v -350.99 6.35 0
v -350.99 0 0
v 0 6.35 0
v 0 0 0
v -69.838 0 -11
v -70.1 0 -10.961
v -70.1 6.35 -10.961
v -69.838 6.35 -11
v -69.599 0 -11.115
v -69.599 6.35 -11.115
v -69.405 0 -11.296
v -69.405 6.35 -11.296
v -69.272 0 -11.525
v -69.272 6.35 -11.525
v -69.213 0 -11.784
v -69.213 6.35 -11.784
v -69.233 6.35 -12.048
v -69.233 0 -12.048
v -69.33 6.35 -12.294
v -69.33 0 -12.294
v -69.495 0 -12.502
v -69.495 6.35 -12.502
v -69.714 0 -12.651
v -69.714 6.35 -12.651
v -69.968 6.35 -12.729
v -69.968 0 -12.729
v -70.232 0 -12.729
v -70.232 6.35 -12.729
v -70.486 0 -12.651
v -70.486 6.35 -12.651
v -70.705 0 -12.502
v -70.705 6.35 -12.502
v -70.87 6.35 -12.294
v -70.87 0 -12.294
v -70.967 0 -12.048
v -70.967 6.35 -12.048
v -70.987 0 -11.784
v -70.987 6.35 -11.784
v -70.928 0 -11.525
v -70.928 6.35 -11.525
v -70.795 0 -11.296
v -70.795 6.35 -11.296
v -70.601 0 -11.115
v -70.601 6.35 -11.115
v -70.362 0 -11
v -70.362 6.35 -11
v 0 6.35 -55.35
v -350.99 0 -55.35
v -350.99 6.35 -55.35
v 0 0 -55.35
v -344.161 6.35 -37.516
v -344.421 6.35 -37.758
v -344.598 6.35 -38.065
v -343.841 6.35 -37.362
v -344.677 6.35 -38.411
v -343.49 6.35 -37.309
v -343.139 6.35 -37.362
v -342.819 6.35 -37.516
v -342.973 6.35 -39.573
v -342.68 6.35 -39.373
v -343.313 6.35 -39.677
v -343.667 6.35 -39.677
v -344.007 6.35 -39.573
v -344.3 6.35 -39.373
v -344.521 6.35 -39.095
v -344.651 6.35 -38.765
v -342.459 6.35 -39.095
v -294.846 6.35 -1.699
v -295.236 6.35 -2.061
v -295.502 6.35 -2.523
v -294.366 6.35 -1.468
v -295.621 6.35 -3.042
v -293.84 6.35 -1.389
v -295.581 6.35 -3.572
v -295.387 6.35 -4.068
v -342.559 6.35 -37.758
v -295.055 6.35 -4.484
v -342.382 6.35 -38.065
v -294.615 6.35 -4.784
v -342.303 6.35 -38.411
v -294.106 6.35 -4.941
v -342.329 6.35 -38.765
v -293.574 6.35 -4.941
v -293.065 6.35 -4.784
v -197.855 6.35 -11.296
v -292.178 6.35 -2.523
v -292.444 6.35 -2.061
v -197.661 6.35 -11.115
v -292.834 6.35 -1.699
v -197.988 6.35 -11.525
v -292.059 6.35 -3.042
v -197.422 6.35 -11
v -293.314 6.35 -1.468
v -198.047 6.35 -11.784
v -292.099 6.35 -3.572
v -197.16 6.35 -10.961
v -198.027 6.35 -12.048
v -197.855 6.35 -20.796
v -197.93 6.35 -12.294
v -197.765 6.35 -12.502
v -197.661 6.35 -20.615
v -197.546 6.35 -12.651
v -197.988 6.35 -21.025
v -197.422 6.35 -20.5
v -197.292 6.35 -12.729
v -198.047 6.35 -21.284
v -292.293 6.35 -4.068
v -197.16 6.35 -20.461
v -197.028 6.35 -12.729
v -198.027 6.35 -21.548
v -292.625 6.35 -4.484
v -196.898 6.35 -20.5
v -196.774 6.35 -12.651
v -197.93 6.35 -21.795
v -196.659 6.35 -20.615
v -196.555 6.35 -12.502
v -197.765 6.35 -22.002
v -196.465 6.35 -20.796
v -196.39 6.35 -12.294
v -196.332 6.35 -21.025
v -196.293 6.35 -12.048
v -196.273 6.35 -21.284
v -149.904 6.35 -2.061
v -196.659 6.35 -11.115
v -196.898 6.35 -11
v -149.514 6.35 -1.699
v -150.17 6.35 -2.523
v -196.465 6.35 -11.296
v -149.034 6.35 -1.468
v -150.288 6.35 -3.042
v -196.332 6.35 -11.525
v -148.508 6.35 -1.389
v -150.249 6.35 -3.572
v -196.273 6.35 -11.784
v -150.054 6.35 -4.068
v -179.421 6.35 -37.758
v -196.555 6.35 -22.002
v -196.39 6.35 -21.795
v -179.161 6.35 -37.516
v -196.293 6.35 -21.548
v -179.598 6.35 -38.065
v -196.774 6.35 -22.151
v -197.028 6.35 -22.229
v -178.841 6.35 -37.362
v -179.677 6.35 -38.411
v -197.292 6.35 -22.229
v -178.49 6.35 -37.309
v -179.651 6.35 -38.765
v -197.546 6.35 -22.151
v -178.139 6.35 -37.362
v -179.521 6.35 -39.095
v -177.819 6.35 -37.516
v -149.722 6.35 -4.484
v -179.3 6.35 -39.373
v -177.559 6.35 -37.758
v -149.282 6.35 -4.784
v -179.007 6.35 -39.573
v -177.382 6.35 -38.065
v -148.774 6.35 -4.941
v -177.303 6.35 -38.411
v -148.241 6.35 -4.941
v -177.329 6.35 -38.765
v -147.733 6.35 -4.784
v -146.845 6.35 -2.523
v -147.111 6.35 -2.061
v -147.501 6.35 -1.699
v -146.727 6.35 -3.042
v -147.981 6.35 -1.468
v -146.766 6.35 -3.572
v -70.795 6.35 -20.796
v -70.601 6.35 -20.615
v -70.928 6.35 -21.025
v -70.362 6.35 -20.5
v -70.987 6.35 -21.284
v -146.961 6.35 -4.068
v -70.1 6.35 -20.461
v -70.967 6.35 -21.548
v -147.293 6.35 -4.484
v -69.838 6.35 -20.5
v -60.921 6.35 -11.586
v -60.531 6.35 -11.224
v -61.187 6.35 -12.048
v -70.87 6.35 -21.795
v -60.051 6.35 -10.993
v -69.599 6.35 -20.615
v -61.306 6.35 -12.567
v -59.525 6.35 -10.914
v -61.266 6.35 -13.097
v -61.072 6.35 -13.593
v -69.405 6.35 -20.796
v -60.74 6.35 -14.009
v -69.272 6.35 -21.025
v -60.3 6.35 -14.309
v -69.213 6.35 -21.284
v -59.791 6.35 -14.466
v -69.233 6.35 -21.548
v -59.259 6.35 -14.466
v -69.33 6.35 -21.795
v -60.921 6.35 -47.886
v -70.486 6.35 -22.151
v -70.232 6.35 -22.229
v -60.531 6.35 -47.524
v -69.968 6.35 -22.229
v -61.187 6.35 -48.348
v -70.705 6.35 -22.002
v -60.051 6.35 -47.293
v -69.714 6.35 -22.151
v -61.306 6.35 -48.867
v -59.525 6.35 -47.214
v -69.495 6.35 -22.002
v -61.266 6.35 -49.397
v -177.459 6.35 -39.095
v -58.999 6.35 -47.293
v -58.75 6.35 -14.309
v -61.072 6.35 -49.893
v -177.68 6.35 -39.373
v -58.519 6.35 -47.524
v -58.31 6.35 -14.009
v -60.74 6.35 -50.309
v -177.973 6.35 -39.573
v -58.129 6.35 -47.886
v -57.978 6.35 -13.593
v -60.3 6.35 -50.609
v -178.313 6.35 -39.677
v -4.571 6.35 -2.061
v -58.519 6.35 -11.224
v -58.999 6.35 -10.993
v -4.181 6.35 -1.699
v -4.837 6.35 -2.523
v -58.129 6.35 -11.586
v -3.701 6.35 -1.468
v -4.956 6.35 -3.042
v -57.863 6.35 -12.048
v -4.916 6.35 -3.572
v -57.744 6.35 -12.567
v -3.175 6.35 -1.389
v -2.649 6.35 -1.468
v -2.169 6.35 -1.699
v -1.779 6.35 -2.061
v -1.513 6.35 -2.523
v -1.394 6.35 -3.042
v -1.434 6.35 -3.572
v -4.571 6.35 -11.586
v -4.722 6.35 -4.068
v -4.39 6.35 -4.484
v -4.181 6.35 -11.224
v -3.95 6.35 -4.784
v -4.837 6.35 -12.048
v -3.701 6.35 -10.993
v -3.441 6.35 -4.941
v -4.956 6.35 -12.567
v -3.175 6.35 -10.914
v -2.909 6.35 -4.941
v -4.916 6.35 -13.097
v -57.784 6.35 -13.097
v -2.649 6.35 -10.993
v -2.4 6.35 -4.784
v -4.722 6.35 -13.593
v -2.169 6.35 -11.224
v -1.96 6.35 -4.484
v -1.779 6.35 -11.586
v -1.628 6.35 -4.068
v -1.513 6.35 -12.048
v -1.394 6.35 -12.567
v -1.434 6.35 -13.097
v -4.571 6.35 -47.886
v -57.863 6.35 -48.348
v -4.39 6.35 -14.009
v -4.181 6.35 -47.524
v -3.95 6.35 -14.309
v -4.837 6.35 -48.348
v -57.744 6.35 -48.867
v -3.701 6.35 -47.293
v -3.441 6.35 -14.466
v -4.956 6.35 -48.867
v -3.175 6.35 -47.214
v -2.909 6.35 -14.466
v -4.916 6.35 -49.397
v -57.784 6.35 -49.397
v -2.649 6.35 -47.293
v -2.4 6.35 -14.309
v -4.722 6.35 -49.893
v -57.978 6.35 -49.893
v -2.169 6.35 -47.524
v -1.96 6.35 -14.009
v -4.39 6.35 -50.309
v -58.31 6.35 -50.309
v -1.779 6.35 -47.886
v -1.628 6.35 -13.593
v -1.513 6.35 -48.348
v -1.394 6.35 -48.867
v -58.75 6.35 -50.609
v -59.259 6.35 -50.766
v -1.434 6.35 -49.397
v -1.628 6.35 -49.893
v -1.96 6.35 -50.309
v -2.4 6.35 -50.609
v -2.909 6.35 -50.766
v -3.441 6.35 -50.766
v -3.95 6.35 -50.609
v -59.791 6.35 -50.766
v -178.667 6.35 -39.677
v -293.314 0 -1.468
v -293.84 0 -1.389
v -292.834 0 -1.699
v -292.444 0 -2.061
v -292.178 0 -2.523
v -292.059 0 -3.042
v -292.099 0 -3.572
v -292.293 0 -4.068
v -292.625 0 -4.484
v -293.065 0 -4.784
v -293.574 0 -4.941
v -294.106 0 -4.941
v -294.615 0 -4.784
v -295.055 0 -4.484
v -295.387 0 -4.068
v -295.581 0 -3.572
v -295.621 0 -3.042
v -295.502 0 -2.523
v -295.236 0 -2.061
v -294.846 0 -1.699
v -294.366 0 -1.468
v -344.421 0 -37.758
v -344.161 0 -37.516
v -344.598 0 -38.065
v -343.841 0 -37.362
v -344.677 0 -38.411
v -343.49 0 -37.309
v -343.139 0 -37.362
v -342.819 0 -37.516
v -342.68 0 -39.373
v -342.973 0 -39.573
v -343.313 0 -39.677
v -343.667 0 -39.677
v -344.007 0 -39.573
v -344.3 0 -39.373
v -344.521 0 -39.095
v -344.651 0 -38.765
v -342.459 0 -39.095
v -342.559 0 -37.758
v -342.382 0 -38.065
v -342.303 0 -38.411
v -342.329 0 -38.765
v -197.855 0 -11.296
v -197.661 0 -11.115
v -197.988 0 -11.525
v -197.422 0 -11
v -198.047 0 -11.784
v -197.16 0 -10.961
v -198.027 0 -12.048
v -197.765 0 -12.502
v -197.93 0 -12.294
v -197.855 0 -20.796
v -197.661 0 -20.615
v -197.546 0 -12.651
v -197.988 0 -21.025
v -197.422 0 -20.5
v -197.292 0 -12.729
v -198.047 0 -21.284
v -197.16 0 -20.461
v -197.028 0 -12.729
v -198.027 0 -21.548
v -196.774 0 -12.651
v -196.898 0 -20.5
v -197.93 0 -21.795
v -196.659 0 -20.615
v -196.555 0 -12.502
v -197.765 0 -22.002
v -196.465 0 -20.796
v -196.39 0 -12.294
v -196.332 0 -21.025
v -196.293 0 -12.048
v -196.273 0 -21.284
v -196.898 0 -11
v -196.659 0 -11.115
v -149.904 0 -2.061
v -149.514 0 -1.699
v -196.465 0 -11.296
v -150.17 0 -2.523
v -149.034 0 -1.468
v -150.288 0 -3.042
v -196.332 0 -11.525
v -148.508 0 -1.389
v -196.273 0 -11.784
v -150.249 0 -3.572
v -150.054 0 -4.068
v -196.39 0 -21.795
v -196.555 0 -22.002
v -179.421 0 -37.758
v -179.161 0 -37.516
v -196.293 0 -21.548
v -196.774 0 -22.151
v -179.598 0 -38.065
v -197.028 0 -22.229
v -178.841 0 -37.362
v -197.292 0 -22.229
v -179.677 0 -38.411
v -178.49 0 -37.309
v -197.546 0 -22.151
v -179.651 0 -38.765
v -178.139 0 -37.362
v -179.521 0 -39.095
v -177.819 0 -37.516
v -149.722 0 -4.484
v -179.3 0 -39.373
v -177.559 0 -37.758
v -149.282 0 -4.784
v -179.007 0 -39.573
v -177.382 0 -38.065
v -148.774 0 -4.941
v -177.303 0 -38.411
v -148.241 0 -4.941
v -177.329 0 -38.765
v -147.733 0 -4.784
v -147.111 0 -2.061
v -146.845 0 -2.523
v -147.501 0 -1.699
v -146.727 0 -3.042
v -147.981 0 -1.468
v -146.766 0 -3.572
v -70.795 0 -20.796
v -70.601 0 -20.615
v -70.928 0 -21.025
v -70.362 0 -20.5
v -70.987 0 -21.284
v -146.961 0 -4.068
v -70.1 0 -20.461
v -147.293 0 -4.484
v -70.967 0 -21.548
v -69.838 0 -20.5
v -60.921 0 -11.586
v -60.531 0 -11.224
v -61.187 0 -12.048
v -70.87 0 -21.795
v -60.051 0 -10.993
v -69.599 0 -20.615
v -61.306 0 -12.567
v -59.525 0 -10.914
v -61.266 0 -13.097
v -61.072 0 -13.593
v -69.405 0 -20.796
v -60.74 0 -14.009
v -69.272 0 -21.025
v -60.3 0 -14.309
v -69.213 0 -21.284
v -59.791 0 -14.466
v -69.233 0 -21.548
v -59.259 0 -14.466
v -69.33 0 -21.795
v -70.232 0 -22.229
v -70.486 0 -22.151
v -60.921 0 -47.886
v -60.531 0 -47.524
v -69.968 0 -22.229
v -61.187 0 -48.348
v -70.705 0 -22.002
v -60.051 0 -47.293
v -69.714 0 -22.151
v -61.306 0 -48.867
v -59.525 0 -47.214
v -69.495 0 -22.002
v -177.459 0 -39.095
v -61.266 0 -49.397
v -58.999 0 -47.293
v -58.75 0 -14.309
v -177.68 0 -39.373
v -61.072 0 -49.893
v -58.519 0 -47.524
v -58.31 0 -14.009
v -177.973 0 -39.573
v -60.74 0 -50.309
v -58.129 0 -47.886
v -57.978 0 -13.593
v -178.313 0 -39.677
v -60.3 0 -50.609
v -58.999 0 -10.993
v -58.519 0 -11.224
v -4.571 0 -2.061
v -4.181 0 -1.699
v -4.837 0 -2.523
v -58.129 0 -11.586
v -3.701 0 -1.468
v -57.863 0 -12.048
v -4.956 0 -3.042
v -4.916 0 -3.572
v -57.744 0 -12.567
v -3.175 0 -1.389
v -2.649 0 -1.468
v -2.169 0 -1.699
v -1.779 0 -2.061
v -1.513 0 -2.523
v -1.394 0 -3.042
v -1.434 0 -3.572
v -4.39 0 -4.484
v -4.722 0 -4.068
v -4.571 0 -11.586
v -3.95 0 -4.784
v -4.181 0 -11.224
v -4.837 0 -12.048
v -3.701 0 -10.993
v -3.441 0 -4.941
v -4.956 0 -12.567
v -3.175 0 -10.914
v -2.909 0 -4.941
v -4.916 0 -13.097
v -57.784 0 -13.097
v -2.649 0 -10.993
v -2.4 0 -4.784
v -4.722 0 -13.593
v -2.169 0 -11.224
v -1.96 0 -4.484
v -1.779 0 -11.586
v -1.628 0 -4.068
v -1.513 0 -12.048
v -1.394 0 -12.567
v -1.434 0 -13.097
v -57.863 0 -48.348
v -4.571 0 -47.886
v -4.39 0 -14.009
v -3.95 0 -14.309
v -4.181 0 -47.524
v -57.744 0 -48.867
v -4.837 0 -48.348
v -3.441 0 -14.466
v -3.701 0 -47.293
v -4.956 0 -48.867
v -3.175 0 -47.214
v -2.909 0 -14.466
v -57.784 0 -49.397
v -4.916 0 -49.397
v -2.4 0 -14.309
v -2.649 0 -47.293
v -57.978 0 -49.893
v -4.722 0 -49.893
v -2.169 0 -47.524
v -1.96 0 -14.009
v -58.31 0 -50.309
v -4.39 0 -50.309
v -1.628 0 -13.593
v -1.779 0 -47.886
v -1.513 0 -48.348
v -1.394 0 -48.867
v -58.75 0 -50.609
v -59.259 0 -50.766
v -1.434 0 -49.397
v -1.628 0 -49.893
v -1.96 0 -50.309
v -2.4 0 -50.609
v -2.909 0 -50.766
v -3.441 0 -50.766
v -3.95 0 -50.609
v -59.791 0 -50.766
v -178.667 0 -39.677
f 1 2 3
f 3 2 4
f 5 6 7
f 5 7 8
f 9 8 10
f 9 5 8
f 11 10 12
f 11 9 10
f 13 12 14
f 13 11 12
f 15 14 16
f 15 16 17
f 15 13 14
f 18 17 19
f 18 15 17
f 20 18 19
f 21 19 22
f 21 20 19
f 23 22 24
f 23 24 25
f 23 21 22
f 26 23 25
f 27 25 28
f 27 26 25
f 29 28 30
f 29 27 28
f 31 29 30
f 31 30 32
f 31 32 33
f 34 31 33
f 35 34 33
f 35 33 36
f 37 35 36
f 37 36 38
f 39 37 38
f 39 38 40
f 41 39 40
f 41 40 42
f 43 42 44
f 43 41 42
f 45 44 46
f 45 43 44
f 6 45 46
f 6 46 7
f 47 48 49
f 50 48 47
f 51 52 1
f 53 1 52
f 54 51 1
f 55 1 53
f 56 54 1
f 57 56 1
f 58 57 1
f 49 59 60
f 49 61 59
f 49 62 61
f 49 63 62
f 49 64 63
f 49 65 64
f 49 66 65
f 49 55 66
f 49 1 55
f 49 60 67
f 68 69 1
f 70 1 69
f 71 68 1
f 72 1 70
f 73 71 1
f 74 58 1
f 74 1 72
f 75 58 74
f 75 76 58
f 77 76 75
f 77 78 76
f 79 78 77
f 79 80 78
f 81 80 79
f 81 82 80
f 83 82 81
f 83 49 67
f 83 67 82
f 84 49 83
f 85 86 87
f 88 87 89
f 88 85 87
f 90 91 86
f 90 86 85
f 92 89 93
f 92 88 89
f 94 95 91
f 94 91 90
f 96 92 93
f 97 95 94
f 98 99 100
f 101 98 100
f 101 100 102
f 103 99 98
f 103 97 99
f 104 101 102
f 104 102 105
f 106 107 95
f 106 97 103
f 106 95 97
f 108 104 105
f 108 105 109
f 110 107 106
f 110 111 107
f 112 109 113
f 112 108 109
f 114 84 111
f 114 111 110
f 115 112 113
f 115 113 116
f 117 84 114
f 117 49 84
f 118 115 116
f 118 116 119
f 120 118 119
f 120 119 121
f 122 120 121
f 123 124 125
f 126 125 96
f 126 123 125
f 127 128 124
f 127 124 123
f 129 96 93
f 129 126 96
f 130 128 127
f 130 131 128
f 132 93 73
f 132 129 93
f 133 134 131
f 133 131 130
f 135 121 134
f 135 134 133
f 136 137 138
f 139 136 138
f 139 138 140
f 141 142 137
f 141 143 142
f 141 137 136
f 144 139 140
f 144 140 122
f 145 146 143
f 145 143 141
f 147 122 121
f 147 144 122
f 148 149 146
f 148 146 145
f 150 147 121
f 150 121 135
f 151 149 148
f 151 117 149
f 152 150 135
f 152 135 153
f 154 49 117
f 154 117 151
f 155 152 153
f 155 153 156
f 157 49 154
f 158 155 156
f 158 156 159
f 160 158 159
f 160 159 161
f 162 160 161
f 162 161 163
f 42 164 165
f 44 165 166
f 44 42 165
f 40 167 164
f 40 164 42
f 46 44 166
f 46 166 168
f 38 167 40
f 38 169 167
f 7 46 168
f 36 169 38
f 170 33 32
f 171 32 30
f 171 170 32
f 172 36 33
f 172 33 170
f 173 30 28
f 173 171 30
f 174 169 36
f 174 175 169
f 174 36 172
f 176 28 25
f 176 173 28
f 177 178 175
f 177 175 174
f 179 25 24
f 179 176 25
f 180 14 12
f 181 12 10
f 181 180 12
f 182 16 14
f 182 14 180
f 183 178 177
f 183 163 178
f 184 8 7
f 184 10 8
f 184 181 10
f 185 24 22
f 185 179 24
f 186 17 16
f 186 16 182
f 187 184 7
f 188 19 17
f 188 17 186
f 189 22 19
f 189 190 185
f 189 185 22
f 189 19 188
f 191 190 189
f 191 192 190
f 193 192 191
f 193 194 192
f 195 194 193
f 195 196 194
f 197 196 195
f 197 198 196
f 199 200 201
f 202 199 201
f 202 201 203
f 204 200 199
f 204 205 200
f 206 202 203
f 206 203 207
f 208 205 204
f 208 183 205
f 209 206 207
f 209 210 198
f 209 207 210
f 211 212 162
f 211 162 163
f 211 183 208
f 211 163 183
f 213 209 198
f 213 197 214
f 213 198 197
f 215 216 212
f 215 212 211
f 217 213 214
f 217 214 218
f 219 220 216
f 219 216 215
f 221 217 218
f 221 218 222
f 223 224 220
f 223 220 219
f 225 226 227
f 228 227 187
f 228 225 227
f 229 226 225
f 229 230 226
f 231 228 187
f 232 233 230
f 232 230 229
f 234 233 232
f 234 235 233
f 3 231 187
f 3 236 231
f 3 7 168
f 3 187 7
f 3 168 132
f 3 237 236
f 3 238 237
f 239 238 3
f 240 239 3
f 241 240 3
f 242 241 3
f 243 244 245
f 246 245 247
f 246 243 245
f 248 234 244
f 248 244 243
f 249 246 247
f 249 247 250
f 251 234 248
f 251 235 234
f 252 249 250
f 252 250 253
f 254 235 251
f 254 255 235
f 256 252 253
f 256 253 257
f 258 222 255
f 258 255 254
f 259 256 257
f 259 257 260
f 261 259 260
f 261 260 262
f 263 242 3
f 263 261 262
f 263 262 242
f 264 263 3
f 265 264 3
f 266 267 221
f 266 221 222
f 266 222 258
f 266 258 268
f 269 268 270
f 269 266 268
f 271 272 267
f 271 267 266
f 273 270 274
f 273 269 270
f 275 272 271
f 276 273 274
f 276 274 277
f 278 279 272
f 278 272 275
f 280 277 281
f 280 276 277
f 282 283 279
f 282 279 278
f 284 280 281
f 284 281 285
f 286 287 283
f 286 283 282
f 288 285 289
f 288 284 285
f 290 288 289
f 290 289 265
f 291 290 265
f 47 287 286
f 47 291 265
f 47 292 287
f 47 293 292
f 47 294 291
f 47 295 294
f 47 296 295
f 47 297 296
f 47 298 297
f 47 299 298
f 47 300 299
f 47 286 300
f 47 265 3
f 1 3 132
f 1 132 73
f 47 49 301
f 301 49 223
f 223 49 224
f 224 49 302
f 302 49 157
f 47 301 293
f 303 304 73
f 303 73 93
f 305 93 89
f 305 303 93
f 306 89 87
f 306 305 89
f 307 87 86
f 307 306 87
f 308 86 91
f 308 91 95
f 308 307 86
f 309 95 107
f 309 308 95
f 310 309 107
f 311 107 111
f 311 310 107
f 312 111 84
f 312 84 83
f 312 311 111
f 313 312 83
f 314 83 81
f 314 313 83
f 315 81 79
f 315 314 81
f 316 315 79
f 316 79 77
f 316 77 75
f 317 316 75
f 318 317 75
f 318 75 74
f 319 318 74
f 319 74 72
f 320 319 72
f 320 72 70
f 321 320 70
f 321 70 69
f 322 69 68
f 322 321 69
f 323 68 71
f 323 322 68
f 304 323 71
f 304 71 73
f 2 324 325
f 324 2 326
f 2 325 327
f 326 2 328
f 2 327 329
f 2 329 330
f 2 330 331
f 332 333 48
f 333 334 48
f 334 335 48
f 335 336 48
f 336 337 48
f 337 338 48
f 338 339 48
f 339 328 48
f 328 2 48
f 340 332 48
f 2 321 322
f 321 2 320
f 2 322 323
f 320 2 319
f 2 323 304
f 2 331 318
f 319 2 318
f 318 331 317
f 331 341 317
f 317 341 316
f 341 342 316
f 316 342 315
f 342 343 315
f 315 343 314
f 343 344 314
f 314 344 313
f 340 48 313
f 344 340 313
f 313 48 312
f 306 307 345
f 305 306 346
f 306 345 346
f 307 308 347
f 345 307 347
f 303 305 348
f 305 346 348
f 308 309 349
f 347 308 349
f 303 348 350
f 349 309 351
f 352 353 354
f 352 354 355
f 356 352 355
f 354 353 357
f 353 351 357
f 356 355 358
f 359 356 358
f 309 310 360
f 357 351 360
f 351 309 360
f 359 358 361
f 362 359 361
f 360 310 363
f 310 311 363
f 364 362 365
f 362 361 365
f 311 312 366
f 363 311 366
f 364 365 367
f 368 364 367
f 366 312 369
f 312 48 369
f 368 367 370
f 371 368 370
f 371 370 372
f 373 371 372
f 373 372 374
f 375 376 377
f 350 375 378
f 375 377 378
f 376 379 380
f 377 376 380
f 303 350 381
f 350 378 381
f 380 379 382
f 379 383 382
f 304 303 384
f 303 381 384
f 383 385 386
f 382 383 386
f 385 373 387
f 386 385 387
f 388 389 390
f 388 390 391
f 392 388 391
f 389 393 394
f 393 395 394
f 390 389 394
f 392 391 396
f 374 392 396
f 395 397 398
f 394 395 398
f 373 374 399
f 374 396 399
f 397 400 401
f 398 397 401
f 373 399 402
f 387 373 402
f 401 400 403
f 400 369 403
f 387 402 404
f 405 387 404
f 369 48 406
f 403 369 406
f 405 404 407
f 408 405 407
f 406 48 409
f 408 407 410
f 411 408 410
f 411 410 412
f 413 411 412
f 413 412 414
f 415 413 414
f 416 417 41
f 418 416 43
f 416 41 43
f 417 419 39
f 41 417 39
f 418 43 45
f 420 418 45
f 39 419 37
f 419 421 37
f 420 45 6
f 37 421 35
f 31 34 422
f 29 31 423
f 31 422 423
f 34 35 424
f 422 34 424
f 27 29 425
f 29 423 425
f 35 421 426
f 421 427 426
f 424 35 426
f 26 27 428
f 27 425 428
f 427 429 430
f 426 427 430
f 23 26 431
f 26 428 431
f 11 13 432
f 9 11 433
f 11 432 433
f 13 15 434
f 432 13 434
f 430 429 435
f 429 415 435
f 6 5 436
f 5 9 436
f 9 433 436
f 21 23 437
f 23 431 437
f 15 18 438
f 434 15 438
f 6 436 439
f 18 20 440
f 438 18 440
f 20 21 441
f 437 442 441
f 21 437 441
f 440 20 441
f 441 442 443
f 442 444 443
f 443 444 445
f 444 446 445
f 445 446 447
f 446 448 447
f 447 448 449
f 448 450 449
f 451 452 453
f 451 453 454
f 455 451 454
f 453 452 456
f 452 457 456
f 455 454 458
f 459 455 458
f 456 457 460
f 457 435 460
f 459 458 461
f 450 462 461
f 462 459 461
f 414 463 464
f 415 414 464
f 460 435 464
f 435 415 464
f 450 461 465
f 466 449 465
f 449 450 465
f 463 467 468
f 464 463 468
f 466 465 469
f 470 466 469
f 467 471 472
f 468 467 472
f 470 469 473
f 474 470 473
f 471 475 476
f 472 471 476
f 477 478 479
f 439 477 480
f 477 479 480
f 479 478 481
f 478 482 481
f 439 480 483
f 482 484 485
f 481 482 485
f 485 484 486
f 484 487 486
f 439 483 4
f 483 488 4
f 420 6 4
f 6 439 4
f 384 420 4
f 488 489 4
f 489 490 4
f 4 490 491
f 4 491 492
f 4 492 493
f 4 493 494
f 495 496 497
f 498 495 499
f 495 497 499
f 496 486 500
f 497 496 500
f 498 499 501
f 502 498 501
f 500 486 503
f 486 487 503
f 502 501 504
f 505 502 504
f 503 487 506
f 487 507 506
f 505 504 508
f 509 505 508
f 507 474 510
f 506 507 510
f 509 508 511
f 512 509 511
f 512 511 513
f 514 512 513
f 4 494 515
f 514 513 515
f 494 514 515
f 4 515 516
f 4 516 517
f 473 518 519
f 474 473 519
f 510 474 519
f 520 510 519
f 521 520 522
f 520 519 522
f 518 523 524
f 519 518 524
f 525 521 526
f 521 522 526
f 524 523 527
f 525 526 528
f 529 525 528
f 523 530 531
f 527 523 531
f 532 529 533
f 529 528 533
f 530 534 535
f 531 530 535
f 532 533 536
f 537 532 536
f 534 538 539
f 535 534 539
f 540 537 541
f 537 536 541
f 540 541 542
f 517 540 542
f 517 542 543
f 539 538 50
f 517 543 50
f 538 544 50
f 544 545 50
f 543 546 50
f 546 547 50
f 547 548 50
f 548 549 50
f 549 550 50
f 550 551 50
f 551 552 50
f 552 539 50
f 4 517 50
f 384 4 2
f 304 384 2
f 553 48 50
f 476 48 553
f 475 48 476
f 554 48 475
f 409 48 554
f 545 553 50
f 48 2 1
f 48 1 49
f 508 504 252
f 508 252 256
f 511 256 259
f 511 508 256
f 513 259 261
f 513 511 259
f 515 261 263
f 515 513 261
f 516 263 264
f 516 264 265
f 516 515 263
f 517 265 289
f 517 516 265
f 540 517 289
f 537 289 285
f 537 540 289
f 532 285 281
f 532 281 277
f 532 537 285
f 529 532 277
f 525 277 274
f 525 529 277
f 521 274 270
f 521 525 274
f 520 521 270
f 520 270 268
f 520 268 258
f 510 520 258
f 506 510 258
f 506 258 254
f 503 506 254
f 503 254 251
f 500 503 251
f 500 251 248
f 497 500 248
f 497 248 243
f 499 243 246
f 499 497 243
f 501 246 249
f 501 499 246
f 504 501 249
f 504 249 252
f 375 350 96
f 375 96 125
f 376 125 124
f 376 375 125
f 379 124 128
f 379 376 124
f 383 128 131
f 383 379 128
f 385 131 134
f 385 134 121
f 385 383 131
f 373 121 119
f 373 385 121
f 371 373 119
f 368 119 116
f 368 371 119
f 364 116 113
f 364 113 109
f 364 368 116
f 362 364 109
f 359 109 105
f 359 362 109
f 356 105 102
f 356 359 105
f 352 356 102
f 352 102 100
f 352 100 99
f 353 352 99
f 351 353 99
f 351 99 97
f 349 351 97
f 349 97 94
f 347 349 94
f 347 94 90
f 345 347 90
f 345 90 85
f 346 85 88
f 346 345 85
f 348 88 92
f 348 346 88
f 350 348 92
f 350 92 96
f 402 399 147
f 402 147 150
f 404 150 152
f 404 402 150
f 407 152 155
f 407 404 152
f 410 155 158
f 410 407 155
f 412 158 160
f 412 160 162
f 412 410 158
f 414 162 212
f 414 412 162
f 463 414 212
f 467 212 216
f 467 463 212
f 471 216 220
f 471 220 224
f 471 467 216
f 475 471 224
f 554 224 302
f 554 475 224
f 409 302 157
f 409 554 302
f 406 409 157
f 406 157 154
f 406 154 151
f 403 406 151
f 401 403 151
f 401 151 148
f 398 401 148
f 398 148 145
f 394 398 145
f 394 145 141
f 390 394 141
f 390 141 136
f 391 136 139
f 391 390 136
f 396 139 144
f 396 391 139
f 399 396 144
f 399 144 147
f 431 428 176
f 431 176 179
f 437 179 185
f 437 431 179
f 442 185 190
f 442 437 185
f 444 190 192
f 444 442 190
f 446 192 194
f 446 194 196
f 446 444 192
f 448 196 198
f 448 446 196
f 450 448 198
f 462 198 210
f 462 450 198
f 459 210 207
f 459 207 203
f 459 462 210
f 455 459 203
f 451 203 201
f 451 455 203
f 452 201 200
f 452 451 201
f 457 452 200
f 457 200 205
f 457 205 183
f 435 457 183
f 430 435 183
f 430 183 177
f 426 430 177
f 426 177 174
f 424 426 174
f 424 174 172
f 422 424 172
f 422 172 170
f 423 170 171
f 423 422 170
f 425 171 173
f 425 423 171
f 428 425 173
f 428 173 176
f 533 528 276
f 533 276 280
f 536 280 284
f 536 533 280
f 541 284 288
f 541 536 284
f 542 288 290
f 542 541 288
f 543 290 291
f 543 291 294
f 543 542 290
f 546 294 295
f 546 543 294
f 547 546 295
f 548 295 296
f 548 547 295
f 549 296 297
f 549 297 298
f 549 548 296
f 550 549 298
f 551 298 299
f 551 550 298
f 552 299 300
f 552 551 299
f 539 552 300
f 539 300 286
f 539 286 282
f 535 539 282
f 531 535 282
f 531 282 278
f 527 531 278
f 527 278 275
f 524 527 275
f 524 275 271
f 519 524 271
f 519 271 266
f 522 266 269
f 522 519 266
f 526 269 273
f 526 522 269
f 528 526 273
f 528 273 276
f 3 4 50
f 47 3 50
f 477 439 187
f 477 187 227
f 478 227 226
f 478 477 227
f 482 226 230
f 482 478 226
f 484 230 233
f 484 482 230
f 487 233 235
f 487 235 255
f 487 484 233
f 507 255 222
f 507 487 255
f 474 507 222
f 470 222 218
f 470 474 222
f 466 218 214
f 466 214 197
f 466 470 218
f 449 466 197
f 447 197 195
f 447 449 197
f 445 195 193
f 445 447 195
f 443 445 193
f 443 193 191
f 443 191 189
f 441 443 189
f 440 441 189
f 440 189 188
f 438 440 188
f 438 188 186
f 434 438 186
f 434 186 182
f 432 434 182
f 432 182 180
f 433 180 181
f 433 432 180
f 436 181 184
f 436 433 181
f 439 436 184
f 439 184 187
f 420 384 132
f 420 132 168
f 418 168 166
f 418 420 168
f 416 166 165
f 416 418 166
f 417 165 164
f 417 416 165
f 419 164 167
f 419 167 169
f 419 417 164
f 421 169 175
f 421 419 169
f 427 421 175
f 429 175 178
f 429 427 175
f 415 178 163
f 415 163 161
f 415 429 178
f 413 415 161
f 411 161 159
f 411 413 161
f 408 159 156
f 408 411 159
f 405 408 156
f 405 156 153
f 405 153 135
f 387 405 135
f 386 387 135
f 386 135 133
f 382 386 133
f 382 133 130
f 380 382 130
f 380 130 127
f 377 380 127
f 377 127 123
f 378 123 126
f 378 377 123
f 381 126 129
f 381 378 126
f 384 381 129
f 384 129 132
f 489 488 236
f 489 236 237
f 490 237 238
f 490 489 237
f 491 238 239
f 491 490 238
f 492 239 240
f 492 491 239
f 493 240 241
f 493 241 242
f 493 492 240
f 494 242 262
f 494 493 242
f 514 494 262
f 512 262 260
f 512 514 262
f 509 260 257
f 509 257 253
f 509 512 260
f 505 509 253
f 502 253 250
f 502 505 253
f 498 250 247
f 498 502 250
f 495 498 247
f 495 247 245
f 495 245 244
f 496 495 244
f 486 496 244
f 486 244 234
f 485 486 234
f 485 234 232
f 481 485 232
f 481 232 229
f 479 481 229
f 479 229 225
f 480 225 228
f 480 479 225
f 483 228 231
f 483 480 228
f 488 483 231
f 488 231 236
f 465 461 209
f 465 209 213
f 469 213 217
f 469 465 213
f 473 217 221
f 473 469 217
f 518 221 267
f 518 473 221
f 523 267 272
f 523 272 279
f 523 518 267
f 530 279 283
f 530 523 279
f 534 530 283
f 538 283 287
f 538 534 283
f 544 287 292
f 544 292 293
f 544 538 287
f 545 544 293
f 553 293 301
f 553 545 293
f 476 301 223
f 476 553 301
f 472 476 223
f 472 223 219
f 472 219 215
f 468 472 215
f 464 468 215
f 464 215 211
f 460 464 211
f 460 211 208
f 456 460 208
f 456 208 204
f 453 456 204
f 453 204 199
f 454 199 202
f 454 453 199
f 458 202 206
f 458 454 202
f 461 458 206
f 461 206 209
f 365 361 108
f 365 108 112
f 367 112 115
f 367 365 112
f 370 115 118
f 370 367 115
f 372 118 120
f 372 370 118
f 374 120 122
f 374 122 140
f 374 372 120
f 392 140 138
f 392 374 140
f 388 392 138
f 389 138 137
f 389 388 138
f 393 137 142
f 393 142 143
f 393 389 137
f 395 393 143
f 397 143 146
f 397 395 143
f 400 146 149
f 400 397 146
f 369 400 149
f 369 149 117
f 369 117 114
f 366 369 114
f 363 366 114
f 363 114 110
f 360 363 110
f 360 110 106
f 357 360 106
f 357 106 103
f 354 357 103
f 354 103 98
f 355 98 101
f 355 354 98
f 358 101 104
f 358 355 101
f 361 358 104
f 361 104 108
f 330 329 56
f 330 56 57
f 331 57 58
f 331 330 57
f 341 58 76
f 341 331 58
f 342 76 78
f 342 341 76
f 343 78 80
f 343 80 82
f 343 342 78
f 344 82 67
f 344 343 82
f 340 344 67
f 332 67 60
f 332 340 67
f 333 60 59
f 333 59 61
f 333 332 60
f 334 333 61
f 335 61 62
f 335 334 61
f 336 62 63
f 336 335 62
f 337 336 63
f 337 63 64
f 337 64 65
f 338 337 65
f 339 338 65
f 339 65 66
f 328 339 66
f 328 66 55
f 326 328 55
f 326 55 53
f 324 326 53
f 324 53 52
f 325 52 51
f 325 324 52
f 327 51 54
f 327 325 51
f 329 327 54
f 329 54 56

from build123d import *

# Parameters (mm, degrees)
SKETCH1_W           = 350.99
SKETCH1_H           = 55.35
SKETCH1_R           = 1.7859375
SKETCH1_R_2         = 0.889
SKETCH1_R_3         = 1.190625
BOSS_EXTRUDE1_DEPTH = 6.35


with BuildPart() as part:
    # Sketch1 → Boss-Extrude1 (new body)
    with BuildSketch(Plane(origin=(0, 0, 0), x_dir=(1, 0, 0), z_dir=(0, 1, 0))):
        with Locations((-175.495, 27.675)):
            Rectangle(SKETCH1_W, SKETCH1_H)
        with Locations(Location((-293.84, 3.175, 0), (0, 0, 270))):
            Circle(SKETCH1_R, mode=Mode.SUBTRACT)
        with Locations(Location((-197.16, 11.85, 0), (0, 0, 270))):
            Circle(SKETCH1_R_2, mode=Mode.SUBTRACT)
        with Locations(Location((-197.16, 21.35, 0), (0, 0, 270))):
            Circle(SKETCH1_R_2, mode=Mode.SUBTRACT)
        with Locations(Location((-70.1, 21.35, 0), (0, 0, 270))):
            Circle(SKETCH1_R_2, mode=Mode.SUBTRACT)
        with Locations(Location((-70.1, 11.85, 0), (0, 0, 270))):
            Circle(SKETCH1_R_2, mode=Mode.SUBTRACT)
        with Locations(Location((-343.49, 38.5, 0), (0, 0, 270))):
            Circle(SKETCH1_R_3, mode=Mode.SUBTRACT)
        with Locations(Location((-178.49, 38.5, 0), (0, 0, 270))):
            Circle(SKETCH1_R_3, mode=Mode.SUBTRACT)
        with Locations(Location((-3.175, 3.175, 0), (0, 0, 270))):
            Circle(SKETCH1_R, mode=Mode.SUBTRACT)
        with Locations(Location((-3.175, 49, 0), (0, 0, 270))):
            Circle(SKETCH1_R, mode=Mode.SUBTRACT)
        with Locations(Location((-3.175, 12.7, 0), (0, 0, 270))):
            Circle(SKETCH1_R, mode=Mode.SUBTRACT)
        with Locations(Location((-148.5075, 3.175, 0), (0, 0, 270))):
            Circle(SKETCH1_R, mode=Mode.SUBTRACT)
        with Locations(Location((-59.525, 49, 0), (0, 0, 270))):
            Circle(SKETCH1_R, mode=Mode.SUBTRACT)
        with Locations(Location((-59.525, 12.7, 0), (0, 0, 270))):
            Circle(SKETCH1_R, mode=Mode.SUBTRACT)
    extrude(amount=BOSS_EXTRUDE1_DEPTH)


solid = part.part
